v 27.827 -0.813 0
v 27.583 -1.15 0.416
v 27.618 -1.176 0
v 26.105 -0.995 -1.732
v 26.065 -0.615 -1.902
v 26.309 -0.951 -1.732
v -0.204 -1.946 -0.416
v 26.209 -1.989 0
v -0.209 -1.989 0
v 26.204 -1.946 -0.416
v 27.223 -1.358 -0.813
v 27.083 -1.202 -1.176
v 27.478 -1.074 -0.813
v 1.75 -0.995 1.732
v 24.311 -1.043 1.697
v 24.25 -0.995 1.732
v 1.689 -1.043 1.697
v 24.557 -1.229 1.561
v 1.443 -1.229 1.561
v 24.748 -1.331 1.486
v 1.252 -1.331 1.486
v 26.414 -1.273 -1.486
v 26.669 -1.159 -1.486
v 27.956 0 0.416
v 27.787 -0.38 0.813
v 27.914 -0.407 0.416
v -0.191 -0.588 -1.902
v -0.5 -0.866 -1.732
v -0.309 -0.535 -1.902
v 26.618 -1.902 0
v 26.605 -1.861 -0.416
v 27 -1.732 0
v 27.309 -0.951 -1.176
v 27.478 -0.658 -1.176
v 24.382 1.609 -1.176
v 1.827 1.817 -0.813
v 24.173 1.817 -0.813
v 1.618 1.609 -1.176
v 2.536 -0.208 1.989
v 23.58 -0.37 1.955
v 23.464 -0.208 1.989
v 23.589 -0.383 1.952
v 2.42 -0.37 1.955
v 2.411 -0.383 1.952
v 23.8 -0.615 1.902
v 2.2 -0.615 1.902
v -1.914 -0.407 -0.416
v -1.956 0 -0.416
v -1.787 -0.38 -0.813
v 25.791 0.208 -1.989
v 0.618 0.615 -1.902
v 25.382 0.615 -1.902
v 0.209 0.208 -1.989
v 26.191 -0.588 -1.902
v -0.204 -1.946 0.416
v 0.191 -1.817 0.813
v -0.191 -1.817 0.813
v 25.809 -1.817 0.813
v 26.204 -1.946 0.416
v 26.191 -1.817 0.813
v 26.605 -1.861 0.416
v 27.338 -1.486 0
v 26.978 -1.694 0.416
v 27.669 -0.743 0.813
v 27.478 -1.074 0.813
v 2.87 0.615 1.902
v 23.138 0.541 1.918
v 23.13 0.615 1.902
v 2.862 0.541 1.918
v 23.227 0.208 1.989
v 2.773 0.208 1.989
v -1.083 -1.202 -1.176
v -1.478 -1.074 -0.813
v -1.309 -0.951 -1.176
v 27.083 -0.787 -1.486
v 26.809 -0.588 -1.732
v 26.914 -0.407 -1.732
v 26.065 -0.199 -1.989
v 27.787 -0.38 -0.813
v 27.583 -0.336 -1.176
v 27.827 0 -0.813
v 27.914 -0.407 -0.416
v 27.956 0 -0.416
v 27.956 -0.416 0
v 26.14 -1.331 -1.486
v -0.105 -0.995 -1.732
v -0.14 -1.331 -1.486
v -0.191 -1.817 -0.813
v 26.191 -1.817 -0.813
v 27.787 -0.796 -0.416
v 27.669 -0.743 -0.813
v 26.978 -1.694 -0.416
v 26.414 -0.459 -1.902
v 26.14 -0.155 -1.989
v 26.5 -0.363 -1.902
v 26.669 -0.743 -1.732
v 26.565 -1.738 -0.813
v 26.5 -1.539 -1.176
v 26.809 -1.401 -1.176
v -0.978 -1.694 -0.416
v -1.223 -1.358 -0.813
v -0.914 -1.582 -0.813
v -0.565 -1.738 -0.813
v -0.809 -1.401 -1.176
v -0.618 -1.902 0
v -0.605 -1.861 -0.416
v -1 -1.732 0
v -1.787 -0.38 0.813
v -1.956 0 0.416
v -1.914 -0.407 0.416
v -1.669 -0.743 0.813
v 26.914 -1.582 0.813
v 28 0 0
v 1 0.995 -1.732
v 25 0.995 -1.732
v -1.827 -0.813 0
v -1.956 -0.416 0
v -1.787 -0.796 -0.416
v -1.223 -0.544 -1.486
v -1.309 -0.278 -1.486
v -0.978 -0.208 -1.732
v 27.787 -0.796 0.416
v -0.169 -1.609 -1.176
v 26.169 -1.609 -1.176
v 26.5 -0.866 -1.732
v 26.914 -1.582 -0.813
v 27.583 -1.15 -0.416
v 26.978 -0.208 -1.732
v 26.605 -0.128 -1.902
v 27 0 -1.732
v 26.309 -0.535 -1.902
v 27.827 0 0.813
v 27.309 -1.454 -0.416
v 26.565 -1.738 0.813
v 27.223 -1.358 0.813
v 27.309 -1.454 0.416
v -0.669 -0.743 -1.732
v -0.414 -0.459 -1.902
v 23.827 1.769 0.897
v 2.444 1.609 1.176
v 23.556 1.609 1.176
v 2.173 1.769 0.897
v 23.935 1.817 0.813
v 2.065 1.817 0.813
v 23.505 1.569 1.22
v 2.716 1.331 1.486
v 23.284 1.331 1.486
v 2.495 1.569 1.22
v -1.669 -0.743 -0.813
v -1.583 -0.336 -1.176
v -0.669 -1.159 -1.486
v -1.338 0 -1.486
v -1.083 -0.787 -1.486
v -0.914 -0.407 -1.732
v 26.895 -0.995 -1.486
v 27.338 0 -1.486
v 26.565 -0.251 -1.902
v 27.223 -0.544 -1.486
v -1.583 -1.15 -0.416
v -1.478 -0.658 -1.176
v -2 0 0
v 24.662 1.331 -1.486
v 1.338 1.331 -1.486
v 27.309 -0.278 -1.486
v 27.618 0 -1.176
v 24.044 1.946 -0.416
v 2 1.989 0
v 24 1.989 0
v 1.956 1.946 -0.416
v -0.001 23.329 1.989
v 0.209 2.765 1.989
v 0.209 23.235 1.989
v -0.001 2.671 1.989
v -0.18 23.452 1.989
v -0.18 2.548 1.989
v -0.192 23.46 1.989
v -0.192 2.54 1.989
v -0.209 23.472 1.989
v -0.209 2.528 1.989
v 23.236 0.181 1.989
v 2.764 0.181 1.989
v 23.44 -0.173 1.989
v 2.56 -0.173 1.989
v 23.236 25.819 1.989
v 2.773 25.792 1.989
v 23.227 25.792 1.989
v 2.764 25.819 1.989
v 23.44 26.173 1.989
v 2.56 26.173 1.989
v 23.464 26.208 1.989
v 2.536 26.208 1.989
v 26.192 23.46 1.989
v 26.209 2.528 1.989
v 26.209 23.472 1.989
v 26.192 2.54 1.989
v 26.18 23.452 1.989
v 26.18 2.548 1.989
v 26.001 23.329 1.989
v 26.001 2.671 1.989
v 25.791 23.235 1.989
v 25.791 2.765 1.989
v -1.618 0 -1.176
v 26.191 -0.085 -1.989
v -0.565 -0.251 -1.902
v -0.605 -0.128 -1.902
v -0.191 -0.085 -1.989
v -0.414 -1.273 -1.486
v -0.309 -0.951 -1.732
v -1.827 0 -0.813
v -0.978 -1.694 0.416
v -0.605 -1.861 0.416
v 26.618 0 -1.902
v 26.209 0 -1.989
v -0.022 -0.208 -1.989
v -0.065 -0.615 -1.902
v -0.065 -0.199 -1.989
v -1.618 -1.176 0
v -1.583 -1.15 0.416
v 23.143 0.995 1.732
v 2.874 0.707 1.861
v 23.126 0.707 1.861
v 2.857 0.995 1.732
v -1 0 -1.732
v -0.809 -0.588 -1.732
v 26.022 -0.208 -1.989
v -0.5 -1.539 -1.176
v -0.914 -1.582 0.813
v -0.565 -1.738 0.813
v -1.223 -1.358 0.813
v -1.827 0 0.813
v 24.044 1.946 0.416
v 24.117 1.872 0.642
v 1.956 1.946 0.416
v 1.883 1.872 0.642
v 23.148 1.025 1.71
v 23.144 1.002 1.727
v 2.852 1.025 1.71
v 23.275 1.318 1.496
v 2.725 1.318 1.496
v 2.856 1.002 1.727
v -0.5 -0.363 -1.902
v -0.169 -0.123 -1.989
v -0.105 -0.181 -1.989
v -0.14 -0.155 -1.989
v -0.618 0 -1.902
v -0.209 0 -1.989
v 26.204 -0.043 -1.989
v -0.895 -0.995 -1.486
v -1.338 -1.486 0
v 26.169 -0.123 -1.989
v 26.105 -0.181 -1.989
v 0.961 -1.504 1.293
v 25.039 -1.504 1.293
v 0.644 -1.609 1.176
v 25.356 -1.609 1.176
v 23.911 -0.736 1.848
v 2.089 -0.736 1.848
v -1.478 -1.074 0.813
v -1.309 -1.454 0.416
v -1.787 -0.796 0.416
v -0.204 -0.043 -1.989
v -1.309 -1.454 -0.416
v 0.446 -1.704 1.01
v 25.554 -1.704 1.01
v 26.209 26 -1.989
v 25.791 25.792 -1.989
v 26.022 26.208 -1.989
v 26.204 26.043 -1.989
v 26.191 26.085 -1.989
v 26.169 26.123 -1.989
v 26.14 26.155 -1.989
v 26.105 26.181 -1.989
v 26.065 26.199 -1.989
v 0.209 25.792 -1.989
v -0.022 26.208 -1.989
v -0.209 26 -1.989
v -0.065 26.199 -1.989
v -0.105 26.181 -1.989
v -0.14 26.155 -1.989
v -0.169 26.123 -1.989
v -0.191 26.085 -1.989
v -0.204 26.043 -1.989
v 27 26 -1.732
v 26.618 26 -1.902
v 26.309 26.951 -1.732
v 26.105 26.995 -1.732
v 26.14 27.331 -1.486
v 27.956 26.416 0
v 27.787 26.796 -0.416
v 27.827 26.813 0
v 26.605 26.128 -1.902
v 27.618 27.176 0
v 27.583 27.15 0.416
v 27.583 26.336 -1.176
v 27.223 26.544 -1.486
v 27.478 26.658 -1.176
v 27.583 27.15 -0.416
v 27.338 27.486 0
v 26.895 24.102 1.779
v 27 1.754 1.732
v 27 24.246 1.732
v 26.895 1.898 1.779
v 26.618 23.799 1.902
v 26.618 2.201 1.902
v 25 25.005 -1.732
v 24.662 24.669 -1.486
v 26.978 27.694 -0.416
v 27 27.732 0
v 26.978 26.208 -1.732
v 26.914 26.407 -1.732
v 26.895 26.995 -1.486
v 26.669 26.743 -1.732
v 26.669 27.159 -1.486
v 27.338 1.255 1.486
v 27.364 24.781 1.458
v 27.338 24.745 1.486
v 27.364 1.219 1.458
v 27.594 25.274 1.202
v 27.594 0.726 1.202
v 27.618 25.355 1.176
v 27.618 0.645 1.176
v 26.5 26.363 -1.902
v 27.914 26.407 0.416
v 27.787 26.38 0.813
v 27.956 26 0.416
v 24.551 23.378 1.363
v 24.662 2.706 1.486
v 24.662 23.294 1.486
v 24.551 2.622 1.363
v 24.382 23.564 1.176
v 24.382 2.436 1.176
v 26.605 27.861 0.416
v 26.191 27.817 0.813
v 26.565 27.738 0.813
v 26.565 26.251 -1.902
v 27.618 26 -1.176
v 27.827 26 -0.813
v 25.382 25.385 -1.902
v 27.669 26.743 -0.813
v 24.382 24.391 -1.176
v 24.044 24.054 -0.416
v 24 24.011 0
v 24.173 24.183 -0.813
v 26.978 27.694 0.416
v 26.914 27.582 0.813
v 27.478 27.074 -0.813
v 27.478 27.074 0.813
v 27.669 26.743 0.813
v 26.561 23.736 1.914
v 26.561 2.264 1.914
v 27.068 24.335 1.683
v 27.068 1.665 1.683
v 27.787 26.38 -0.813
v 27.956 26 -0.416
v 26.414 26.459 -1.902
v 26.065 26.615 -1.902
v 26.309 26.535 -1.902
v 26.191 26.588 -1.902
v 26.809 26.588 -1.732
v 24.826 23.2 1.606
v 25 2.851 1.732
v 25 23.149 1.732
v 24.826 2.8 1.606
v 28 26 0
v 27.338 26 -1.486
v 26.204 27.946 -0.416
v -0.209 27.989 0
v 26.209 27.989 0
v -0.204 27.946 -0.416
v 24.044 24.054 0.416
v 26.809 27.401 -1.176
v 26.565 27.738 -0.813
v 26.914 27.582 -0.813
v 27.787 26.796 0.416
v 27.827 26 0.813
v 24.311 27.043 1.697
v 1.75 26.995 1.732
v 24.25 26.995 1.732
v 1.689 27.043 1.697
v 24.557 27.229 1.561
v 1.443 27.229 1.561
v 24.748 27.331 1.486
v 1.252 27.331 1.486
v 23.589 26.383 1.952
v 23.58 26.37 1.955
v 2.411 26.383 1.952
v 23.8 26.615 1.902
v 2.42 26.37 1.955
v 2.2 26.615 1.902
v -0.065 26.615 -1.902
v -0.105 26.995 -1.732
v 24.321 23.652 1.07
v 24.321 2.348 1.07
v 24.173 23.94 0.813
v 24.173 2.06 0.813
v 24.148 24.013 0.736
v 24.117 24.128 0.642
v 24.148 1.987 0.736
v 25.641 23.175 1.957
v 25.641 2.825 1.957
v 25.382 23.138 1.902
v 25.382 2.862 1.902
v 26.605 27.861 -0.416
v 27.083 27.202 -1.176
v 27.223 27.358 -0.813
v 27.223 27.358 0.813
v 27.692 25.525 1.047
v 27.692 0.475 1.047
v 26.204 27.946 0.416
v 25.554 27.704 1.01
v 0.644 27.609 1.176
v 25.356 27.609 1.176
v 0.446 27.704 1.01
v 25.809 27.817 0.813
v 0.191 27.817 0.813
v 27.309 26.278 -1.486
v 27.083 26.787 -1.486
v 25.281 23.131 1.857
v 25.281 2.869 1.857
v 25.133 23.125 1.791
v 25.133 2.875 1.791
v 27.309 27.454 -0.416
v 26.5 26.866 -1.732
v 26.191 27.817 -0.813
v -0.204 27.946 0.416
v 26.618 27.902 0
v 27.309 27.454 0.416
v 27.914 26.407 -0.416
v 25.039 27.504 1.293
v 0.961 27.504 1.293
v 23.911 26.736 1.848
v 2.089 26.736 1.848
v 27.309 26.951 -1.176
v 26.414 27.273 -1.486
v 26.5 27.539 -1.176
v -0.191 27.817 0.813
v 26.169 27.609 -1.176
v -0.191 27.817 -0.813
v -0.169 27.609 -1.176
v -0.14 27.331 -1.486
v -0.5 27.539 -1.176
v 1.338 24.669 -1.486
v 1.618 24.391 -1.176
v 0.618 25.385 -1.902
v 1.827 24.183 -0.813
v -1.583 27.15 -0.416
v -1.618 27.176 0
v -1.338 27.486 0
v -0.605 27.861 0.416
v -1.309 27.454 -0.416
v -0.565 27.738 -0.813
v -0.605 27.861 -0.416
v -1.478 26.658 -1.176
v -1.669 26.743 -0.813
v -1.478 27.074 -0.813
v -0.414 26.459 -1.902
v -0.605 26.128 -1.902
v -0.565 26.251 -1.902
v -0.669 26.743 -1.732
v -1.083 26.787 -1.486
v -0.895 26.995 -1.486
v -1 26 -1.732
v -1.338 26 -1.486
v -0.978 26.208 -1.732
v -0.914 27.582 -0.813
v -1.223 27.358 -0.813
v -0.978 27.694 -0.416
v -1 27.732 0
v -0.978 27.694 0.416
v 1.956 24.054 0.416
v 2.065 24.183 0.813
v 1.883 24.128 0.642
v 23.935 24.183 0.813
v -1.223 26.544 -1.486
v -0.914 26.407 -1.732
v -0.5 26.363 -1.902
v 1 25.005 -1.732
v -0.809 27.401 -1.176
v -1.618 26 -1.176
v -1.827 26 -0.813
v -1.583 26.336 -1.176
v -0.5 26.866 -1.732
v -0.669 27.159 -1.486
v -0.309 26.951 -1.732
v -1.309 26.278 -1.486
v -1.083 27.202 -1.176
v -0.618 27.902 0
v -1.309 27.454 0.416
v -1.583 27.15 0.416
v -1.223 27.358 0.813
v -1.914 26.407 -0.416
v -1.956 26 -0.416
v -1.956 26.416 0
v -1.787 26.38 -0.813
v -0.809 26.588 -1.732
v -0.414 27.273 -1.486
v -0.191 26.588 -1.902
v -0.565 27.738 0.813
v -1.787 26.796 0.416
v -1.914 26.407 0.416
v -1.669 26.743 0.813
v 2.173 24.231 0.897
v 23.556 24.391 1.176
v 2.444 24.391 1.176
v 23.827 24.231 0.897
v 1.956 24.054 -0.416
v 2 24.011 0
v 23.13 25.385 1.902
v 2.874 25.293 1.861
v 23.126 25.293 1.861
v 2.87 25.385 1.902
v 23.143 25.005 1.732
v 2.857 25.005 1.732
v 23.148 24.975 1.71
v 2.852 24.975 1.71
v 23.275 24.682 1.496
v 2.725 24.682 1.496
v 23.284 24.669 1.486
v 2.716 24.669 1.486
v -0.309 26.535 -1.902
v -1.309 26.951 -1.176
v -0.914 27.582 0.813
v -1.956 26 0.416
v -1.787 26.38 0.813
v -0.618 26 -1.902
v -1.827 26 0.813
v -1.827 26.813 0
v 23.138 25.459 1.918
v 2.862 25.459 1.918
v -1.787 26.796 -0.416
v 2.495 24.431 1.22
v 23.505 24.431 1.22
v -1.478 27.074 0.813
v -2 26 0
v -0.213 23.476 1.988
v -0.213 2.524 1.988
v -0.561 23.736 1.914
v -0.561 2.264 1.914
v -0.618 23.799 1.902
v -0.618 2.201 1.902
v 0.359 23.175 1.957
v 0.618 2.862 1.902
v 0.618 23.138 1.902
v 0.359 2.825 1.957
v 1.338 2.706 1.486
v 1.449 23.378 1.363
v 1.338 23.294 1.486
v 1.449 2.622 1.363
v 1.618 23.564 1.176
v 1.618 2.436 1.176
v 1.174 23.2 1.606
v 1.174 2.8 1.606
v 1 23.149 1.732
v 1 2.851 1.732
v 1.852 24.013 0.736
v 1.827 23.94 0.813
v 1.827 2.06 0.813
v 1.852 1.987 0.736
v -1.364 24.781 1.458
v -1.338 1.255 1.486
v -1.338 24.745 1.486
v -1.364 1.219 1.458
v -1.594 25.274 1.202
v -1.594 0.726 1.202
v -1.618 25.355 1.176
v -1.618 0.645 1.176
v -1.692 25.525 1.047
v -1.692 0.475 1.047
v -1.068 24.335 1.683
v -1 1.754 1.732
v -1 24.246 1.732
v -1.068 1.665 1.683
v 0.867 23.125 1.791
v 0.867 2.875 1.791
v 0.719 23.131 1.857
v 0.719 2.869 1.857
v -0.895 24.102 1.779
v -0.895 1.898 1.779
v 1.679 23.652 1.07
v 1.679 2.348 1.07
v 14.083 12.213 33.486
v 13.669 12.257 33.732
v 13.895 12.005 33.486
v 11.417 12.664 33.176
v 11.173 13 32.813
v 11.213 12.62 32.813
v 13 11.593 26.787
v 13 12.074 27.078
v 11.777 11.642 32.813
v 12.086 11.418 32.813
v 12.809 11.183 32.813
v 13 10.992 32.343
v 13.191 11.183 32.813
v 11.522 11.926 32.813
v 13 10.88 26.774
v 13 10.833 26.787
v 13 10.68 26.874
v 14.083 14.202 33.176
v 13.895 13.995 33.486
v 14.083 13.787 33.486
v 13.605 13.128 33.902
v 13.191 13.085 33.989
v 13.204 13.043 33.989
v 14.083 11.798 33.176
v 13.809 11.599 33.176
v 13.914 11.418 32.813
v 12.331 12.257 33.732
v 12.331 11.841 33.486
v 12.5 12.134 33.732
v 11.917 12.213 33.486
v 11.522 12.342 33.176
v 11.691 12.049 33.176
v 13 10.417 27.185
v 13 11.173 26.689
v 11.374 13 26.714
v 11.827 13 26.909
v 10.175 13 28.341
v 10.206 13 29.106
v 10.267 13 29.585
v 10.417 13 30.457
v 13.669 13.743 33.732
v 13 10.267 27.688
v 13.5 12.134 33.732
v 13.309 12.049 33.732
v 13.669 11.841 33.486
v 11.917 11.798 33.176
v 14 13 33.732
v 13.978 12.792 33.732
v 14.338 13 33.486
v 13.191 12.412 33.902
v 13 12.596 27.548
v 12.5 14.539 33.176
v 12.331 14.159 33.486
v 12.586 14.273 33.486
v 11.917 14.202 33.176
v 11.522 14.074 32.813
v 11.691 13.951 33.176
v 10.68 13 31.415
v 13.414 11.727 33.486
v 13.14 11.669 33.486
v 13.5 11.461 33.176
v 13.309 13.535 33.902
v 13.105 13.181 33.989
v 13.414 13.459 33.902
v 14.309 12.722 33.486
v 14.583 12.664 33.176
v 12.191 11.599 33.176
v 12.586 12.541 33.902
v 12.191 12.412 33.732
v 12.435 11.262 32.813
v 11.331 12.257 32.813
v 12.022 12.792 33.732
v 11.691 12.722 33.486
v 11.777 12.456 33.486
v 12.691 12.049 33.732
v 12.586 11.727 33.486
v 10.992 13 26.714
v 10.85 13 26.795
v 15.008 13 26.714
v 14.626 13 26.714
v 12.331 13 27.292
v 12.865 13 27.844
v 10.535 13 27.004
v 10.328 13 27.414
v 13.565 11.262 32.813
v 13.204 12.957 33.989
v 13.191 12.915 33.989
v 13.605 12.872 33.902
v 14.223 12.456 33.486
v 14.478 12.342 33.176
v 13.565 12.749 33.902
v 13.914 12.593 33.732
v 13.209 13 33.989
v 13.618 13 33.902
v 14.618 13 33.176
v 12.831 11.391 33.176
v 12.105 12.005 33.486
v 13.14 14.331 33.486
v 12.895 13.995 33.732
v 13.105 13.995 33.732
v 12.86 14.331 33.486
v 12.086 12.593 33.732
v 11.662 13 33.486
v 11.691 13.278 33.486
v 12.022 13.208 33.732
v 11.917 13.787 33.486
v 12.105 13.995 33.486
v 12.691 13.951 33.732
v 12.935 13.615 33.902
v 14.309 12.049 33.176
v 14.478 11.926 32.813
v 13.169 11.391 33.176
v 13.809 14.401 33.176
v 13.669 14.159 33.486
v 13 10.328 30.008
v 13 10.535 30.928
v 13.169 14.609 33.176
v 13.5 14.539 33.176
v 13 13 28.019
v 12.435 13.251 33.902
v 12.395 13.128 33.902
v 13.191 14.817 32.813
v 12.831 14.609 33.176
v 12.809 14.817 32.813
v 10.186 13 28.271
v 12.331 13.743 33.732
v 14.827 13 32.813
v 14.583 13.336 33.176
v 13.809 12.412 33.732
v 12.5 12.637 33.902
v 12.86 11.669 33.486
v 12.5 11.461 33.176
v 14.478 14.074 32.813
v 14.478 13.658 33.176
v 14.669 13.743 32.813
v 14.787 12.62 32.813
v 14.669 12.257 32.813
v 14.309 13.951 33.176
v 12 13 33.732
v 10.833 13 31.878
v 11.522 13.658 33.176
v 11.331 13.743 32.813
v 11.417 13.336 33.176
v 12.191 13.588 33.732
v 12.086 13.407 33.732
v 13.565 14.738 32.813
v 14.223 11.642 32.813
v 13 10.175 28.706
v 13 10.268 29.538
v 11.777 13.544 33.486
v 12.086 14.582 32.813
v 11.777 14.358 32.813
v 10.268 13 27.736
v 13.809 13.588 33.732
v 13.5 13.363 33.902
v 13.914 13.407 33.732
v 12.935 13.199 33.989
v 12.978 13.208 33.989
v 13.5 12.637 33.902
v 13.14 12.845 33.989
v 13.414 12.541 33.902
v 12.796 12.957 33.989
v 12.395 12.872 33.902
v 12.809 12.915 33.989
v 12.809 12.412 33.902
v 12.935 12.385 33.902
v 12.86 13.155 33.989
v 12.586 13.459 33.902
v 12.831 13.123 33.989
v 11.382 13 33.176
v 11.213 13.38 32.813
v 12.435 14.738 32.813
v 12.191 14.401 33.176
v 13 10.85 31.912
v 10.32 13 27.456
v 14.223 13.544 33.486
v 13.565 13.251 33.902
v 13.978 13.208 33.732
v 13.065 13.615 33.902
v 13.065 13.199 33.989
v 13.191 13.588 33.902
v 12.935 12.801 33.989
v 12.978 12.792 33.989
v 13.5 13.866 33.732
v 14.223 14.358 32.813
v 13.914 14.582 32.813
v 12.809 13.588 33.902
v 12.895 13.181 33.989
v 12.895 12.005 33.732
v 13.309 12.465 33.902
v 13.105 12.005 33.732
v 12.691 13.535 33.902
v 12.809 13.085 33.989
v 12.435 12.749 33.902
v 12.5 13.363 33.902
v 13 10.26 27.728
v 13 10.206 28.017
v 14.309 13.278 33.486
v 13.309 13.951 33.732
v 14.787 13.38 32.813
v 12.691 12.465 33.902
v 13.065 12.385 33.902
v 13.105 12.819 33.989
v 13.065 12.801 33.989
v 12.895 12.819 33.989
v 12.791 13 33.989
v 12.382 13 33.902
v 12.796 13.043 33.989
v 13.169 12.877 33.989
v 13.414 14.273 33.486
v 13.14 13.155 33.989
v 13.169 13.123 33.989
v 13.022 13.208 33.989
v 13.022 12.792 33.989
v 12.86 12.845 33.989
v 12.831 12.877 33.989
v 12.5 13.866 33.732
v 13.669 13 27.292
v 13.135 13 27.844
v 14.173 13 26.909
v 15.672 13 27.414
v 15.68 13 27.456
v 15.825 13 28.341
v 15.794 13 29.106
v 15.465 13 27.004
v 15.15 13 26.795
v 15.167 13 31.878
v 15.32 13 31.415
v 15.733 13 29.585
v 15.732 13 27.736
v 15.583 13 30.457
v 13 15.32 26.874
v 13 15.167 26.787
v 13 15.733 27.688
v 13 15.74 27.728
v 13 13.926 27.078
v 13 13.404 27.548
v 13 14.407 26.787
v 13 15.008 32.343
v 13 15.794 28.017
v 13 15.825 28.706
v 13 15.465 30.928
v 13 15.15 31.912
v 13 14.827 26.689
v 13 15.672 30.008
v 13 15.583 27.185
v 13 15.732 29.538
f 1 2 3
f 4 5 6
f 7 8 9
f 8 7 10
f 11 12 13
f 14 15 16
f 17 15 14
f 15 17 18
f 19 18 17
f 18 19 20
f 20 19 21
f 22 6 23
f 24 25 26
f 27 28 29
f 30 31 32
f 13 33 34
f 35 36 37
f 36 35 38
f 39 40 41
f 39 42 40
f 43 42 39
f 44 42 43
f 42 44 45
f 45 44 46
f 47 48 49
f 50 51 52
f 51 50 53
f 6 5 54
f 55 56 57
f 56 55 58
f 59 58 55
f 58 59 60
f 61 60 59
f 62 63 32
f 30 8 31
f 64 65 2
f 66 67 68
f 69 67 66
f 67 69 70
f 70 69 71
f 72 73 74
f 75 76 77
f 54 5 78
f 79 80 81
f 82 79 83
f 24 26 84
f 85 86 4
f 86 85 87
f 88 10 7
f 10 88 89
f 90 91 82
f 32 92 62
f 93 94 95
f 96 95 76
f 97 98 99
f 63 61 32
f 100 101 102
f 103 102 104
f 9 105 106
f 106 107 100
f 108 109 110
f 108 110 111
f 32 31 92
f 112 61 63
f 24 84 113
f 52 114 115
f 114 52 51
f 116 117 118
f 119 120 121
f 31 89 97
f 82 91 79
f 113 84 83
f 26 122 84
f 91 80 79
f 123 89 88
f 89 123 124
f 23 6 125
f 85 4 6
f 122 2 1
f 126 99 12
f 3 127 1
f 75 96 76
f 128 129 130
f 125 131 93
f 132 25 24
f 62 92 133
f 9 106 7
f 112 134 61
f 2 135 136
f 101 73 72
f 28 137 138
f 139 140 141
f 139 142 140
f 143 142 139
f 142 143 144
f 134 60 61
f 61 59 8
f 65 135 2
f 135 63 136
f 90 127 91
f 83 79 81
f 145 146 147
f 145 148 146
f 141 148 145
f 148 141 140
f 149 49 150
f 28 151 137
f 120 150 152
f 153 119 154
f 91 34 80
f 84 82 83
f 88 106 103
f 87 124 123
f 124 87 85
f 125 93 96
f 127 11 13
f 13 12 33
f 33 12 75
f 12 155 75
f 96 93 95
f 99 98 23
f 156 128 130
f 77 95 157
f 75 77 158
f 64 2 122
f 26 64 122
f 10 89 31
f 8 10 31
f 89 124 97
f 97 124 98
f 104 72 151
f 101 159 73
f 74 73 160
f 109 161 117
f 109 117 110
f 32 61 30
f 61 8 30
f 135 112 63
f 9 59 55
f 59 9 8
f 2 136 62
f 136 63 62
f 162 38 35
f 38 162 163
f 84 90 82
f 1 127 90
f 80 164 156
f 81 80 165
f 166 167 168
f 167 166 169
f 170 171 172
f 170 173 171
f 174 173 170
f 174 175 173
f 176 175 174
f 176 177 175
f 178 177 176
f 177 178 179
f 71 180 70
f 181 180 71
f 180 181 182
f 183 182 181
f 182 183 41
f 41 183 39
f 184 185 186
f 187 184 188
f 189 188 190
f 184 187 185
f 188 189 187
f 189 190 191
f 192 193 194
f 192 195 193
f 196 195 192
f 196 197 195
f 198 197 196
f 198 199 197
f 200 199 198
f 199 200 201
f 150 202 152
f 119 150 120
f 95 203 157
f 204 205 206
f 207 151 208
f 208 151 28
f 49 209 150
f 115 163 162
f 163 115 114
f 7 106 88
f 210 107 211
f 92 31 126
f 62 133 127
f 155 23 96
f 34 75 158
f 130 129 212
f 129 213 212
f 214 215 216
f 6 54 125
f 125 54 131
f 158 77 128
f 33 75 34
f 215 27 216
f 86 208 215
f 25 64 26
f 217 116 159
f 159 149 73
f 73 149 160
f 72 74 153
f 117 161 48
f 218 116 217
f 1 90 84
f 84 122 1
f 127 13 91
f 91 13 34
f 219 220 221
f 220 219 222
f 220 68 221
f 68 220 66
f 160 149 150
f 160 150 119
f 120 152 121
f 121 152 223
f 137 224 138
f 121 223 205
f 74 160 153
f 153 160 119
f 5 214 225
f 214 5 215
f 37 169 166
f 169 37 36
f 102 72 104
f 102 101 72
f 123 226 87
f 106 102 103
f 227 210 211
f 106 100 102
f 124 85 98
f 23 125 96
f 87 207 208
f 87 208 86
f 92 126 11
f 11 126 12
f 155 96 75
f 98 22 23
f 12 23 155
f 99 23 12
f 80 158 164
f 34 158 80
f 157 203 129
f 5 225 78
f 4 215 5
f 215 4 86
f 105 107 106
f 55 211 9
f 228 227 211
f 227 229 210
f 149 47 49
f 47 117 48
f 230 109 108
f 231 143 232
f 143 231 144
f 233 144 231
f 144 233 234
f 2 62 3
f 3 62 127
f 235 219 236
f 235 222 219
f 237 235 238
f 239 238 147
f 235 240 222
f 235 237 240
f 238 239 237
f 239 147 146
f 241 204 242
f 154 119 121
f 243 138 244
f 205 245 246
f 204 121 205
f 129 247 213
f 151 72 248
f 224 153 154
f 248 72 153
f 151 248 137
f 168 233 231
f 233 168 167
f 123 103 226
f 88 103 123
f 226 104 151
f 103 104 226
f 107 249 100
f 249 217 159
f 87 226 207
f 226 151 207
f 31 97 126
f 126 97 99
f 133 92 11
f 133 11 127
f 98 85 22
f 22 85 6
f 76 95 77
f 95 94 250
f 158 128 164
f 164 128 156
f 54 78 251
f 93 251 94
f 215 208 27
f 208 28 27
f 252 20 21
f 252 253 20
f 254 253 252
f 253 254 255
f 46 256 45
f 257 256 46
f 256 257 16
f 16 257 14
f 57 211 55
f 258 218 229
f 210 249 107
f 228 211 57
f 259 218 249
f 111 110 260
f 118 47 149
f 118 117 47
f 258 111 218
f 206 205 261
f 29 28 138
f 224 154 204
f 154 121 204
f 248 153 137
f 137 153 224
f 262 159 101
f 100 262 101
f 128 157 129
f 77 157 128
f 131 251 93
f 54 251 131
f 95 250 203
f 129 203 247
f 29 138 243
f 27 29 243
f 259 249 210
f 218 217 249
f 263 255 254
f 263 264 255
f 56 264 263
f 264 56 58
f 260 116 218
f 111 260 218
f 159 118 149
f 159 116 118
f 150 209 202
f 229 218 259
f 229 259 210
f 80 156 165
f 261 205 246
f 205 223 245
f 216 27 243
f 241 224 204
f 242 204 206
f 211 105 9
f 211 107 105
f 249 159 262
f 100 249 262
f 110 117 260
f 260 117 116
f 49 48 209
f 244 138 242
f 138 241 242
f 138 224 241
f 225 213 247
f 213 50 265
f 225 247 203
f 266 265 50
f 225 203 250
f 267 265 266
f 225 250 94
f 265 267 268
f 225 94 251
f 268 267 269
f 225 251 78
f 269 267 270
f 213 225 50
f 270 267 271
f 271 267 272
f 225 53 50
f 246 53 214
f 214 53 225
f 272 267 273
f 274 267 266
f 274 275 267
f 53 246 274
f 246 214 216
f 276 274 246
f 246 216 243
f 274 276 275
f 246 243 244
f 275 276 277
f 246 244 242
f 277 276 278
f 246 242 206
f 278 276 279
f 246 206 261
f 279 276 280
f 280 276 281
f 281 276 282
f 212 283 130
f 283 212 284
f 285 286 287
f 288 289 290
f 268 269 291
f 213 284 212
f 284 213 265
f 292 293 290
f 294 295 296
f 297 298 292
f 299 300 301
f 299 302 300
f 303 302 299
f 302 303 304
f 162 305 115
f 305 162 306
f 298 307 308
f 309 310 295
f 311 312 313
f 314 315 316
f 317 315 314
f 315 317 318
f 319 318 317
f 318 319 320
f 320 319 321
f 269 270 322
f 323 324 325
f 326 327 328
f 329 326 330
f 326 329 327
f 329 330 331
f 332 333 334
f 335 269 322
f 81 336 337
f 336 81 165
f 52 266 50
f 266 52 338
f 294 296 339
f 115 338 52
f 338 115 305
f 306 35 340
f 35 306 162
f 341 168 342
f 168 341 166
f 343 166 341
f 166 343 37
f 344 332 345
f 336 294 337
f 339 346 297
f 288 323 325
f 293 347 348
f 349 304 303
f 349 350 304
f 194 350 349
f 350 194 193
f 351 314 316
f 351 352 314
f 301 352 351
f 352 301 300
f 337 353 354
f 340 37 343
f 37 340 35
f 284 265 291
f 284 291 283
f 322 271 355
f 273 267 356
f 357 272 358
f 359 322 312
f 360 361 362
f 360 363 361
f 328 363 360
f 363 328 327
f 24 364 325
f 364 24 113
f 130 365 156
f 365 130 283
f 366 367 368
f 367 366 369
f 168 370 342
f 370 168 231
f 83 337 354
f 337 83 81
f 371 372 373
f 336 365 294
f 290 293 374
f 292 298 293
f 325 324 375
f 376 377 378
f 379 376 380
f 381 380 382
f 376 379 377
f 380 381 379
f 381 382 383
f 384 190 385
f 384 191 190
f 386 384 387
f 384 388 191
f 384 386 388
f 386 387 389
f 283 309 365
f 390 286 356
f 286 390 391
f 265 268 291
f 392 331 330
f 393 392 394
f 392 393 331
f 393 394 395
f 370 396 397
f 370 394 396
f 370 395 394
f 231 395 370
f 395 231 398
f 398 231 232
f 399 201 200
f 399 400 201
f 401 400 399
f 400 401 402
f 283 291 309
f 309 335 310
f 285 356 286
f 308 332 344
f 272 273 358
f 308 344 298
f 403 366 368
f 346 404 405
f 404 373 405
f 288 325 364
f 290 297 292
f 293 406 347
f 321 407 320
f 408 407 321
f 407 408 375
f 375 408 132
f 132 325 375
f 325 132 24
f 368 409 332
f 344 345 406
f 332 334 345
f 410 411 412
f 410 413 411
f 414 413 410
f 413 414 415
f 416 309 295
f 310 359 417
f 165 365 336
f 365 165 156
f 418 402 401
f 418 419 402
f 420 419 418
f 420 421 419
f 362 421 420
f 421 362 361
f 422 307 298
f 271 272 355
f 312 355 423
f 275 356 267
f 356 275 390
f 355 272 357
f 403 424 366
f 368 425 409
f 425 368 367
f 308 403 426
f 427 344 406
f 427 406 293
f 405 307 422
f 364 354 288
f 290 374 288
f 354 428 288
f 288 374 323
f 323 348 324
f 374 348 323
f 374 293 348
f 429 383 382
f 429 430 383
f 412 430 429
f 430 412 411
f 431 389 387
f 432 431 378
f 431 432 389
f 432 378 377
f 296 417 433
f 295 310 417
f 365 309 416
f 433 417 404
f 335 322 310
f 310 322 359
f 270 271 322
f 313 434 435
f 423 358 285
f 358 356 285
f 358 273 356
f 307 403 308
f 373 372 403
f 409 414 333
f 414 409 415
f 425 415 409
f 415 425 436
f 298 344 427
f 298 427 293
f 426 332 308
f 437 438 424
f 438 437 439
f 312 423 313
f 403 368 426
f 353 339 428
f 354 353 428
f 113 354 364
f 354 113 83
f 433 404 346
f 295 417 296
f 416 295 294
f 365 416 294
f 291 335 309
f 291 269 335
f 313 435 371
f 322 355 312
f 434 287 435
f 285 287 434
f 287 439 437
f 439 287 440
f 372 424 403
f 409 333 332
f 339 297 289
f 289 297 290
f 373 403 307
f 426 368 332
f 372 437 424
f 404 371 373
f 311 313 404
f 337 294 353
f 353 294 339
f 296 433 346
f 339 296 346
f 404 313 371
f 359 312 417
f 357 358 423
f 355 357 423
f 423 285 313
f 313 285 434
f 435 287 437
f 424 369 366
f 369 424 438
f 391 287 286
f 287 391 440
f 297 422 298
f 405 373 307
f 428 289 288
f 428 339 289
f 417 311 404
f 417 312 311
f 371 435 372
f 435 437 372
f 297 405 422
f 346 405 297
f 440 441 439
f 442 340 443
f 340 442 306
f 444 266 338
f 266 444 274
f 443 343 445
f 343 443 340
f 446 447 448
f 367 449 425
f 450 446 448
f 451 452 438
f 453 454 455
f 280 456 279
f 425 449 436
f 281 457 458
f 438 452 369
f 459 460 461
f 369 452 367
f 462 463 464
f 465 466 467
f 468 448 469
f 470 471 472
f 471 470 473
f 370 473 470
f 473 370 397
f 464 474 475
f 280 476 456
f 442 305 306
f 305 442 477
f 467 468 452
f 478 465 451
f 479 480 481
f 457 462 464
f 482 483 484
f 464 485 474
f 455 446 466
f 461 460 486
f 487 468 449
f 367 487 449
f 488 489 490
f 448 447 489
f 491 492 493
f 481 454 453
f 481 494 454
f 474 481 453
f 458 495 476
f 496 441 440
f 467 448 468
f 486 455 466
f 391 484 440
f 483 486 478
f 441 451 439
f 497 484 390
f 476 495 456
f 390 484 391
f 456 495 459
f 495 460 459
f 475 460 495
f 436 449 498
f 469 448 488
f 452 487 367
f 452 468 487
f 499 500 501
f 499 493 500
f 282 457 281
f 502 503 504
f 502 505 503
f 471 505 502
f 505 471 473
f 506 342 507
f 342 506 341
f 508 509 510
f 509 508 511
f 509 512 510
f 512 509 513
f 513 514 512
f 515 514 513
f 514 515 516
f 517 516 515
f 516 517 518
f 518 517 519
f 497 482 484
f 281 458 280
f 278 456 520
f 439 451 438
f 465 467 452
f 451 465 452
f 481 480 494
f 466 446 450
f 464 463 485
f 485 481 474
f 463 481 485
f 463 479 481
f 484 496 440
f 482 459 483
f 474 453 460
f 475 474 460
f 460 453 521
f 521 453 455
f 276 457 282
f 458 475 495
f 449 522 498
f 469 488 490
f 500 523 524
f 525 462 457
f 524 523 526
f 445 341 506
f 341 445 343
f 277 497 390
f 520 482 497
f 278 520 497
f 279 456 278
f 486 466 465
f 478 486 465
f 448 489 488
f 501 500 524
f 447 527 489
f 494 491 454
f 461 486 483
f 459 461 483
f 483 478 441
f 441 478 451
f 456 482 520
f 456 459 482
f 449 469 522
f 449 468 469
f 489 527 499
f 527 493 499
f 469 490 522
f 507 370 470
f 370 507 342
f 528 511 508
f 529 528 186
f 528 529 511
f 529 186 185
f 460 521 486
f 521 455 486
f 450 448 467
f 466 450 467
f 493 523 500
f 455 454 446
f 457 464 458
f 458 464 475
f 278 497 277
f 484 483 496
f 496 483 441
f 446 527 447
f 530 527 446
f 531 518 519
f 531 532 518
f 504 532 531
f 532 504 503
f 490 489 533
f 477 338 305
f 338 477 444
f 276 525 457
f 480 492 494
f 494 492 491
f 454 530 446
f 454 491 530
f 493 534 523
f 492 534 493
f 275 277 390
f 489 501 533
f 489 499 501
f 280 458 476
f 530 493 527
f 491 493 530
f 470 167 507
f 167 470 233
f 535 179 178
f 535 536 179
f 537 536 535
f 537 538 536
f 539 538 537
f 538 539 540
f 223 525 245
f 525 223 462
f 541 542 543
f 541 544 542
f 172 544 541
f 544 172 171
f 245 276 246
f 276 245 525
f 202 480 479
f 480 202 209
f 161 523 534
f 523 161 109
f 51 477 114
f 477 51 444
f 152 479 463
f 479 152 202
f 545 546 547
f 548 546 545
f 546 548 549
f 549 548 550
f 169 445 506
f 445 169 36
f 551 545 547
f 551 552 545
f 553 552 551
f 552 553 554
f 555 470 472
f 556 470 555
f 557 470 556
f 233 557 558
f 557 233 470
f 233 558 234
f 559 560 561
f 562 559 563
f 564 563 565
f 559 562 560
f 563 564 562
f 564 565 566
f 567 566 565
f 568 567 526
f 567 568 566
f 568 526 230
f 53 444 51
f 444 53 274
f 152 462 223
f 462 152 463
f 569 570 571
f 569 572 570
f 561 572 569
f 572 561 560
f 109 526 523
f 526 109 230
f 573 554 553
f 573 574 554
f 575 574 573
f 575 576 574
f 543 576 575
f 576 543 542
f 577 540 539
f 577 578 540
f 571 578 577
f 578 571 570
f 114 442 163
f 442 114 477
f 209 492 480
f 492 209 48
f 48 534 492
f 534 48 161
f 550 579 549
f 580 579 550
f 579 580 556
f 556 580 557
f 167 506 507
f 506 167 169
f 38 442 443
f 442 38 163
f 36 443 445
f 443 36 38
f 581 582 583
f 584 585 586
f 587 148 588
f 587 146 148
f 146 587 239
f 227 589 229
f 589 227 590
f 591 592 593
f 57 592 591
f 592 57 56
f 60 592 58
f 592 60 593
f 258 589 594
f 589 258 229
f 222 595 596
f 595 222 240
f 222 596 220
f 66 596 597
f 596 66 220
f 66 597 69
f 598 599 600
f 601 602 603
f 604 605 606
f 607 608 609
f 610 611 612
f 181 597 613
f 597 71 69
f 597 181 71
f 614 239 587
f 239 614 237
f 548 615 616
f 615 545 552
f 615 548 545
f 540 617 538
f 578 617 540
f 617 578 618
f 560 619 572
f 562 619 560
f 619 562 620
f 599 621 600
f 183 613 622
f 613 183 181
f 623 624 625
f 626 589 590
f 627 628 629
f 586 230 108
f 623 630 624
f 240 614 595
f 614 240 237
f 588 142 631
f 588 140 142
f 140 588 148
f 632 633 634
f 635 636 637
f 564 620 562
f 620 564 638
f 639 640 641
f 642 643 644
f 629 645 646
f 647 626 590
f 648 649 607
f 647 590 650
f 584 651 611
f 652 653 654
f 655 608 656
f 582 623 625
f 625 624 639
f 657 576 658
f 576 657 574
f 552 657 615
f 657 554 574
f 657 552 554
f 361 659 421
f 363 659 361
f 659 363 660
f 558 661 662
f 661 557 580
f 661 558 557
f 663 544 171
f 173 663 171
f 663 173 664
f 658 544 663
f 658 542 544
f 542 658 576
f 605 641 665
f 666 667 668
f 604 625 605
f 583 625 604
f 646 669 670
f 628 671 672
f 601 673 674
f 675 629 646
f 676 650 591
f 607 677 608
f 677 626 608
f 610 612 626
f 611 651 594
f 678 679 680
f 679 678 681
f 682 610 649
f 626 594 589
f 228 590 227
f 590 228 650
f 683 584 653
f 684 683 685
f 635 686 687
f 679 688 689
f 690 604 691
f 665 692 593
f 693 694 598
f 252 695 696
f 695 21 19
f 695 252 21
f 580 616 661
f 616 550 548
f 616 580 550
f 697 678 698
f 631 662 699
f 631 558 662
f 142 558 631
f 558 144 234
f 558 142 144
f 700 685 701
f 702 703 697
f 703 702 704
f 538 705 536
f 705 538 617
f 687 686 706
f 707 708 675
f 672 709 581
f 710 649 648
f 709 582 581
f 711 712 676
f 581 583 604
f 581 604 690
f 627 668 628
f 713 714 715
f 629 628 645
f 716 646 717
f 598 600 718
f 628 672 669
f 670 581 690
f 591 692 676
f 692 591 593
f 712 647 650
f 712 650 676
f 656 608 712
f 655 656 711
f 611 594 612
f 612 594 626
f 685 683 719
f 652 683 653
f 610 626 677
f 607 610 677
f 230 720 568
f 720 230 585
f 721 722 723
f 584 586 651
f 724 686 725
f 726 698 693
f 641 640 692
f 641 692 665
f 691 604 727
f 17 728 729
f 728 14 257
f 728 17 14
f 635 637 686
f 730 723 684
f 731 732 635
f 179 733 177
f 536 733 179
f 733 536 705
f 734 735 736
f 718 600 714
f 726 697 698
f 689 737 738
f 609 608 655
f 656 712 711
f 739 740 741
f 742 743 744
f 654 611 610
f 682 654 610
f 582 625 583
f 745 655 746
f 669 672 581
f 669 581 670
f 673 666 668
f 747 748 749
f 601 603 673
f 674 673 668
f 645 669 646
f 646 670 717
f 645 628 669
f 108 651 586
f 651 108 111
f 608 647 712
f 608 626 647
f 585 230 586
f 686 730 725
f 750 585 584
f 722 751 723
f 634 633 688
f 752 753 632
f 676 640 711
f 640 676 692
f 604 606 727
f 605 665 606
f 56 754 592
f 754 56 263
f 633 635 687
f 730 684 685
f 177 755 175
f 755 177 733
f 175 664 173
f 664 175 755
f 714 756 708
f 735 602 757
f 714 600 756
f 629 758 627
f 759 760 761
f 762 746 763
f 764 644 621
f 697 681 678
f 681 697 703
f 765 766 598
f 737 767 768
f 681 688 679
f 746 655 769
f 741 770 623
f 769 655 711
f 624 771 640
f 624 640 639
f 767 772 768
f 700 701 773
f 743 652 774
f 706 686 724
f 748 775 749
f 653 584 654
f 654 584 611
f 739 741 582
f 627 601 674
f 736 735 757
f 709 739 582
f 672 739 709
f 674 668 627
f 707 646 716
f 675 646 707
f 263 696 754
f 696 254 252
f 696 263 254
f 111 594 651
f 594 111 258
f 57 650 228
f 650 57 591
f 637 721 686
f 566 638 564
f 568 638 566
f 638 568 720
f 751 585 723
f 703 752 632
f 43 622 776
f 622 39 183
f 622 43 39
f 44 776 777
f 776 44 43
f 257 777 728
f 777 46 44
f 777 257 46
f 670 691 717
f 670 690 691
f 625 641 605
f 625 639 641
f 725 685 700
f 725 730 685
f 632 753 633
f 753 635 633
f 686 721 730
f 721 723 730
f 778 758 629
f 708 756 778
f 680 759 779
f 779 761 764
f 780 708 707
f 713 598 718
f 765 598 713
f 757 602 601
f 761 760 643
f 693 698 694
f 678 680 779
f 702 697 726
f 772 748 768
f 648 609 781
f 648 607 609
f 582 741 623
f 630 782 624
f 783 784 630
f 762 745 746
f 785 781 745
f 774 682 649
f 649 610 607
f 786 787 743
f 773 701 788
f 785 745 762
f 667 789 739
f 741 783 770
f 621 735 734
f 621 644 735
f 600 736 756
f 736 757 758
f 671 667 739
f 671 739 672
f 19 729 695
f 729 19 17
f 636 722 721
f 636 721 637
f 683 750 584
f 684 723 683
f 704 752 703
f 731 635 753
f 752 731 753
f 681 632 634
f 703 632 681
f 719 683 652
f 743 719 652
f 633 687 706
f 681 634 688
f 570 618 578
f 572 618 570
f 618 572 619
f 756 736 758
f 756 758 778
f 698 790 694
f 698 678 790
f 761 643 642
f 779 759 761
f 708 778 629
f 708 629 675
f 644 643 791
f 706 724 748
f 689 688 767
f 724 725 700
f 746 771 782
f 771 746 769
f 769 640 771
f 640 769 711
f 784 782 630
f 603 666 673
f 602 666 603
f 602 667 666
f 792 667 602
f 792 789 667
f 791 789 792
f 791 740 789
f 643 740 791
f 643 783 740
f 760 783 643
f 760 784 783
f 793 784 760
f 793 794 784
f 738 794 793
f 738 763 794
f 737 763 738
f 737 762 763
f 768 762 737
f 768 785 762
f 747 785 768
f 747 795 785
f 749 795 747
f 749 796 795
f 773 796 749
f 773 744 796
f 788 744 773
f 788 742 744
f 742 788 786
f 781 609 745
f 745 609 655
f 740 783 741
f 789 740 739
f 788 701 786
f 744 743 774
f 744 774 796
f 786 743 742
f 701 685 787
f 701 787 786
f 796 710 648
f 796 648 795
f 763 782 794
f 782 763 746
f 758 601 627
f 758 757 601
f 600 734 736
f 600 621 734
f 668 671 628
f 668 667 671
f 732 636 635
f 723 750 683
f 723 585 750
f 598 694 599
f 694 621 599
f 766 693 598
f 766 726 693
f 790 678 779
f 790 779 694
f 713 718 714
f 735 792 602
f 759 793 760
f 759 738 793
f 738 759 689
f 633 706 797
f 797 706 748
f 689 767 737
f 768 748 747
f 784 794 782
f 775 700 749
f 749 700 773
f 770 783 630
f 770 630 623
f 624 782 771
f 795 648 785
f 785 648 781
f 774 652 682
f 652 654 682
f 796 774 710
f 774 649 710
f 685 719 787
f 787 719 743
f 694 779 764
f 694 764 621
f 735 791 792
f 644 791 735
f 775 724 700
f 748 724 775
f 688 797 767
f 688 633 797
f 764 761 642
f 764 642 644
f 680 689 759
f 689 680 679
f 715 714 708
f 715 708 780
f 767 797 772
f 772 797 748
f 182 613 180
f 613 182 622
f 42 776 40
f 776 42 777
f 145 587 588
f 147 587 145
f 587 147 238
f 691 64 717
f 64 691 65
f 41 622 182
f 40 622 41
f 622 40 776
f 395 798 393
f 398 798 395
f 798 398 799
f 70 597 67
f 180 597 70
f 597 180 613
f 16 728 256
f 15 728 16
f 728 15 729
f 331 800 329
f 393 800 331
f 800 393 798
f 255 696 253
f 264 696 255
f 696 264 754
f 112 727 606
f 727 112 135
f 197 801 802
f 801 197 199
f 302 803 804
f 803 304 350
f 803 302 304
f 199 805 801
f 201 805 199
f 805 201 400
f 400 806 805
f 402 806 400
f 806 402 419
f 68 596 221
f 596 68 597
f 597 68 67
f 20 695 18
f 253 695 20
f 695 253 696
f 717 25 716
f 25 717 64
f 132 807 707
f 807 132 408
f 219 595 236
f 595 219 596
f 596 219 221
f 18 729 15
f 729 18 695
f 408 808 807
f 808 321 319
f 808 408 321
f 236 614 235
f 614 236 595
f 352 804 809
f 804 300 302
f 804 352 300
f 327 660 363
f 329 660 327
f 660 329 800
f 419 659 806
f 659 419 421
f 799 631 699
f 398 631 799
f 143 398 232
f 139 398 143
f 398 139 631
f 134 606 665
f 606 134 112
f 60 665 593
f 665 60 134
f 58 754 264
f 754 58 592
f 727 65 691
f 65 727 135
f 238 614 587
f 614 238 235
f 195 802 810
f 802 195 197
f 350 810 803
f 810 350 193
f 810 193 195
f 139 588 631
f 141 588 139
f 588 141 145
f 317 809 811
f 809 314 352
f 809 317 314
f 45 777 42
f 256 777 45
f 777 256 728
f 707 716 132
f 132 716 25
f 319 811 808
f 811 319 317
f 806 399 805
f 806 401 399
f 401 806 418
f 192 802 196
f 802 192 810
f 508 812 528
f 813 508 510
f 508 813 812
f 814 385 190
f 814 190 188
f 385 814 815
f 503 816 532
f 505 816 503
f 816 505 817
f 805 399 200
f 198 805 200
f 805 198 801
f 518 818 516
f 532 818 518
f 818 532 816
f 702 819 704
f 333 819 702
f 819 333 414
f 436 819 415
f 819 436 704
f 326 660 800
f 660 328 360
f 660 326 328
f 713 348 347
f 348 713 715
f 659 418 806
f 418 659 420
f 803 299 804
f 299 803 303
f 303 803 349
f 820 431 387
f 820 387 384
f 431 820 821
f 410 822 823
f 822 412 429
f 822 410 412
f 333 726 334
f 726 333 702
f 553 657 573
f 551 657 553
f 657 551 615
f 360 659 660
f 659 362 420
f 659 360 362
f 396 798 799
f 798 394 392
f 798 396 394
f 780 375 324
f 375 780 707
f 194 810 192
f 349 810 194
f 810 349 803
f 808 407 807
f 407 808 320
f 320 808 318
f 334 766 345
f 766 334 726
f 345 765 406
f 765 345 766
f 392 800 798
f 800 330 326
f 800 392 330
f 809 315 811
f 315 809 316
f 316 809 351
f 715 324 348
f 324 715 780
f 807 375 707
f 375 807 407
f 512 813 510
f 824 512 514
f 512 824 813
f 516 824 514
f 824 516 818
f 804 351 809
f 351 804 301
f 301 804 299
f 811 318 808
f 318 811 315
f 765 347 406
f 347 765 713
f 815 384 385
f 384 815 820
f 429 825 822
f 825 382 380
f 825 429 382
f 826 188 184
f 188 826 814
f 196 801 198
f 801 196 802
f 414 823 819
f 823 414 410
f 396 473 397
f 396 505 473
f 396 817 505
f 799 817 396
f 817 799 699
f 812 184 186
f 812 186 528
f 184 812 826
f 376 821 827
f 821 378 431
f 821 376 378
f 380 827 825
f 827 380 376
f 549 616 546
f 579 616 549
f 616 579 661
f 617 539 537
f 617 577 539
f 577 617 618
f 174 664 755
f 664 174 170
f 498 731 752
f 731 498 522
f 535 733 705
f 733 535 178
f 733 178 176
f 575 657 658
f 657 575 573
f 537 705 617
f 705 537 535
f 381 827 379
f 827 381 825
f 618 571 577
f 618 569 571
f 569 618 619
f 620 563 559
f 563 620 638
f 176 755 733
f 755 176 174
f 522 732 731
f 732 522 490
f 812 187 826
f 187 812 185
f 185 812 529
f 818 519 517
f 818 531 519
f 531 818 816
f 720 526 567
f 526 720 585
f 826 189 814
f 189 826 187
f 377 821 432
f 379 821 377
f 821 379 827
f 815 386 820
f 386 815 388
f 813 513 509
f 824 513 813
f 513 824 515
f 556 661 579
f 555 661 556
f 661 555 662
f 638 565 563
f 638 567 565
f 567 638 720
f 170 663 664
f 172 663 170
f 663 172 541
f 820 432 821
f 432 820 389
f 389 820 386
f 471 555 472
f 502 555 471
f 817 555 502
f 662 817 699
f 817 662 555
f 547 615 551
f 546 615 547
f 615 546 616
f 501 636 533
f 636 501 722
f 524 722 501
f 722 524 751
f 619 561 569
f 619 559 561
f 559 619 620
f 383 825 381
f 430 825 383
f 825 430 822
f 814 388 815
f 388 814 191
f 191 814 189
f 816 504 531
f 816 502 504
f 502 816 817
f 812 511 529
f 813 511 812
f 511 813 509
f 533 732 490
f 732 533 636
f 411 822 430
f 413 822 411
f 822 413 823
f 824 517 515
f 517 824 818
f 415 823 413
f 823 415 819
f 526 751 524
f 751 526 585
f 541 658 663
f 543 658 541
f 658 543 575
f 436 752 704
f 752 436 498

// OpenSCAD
Resolution=30; // Resoultion

Length=30; // Side Length of base

Height=34; // Height of base

Radius=2; // Radius of posts

/* Hidden */
r=Radius;

$fn=Resolution;

lng=Length-r-r;

// Customizable Square Pyramid wireframe by skitcher



module sphere1(){
    sphere(r);
}

module sphere2(){
    translate([lng,0,0]) sphere(r);
}

module sphere3(){
    translate([lng,lng,0]) sphere(r);
}

module sphere4(){
    translate([0,lng,0]) sphere(r);
}

module sphere5(){
    translate([lng/2,lng/2,Height-r]) sphere(r);
}




// HULL //

//base
hull(){
    sphere1();
    sphere2();
}

hull(){
    sphere2();
    sphere3();
}

hull(){
    sphere3();
    sphere4();
}

hull(){
    sphere4();
    sphere1();
}

//top
hull(){
    sphere1();
    sphere5();
}

hull(){
    sphere2();
    sphere5();
}

hull(){
    sphere3();
    sphere5();
}

hull(){
    sphere4();
    sphere5();
}

// END //
